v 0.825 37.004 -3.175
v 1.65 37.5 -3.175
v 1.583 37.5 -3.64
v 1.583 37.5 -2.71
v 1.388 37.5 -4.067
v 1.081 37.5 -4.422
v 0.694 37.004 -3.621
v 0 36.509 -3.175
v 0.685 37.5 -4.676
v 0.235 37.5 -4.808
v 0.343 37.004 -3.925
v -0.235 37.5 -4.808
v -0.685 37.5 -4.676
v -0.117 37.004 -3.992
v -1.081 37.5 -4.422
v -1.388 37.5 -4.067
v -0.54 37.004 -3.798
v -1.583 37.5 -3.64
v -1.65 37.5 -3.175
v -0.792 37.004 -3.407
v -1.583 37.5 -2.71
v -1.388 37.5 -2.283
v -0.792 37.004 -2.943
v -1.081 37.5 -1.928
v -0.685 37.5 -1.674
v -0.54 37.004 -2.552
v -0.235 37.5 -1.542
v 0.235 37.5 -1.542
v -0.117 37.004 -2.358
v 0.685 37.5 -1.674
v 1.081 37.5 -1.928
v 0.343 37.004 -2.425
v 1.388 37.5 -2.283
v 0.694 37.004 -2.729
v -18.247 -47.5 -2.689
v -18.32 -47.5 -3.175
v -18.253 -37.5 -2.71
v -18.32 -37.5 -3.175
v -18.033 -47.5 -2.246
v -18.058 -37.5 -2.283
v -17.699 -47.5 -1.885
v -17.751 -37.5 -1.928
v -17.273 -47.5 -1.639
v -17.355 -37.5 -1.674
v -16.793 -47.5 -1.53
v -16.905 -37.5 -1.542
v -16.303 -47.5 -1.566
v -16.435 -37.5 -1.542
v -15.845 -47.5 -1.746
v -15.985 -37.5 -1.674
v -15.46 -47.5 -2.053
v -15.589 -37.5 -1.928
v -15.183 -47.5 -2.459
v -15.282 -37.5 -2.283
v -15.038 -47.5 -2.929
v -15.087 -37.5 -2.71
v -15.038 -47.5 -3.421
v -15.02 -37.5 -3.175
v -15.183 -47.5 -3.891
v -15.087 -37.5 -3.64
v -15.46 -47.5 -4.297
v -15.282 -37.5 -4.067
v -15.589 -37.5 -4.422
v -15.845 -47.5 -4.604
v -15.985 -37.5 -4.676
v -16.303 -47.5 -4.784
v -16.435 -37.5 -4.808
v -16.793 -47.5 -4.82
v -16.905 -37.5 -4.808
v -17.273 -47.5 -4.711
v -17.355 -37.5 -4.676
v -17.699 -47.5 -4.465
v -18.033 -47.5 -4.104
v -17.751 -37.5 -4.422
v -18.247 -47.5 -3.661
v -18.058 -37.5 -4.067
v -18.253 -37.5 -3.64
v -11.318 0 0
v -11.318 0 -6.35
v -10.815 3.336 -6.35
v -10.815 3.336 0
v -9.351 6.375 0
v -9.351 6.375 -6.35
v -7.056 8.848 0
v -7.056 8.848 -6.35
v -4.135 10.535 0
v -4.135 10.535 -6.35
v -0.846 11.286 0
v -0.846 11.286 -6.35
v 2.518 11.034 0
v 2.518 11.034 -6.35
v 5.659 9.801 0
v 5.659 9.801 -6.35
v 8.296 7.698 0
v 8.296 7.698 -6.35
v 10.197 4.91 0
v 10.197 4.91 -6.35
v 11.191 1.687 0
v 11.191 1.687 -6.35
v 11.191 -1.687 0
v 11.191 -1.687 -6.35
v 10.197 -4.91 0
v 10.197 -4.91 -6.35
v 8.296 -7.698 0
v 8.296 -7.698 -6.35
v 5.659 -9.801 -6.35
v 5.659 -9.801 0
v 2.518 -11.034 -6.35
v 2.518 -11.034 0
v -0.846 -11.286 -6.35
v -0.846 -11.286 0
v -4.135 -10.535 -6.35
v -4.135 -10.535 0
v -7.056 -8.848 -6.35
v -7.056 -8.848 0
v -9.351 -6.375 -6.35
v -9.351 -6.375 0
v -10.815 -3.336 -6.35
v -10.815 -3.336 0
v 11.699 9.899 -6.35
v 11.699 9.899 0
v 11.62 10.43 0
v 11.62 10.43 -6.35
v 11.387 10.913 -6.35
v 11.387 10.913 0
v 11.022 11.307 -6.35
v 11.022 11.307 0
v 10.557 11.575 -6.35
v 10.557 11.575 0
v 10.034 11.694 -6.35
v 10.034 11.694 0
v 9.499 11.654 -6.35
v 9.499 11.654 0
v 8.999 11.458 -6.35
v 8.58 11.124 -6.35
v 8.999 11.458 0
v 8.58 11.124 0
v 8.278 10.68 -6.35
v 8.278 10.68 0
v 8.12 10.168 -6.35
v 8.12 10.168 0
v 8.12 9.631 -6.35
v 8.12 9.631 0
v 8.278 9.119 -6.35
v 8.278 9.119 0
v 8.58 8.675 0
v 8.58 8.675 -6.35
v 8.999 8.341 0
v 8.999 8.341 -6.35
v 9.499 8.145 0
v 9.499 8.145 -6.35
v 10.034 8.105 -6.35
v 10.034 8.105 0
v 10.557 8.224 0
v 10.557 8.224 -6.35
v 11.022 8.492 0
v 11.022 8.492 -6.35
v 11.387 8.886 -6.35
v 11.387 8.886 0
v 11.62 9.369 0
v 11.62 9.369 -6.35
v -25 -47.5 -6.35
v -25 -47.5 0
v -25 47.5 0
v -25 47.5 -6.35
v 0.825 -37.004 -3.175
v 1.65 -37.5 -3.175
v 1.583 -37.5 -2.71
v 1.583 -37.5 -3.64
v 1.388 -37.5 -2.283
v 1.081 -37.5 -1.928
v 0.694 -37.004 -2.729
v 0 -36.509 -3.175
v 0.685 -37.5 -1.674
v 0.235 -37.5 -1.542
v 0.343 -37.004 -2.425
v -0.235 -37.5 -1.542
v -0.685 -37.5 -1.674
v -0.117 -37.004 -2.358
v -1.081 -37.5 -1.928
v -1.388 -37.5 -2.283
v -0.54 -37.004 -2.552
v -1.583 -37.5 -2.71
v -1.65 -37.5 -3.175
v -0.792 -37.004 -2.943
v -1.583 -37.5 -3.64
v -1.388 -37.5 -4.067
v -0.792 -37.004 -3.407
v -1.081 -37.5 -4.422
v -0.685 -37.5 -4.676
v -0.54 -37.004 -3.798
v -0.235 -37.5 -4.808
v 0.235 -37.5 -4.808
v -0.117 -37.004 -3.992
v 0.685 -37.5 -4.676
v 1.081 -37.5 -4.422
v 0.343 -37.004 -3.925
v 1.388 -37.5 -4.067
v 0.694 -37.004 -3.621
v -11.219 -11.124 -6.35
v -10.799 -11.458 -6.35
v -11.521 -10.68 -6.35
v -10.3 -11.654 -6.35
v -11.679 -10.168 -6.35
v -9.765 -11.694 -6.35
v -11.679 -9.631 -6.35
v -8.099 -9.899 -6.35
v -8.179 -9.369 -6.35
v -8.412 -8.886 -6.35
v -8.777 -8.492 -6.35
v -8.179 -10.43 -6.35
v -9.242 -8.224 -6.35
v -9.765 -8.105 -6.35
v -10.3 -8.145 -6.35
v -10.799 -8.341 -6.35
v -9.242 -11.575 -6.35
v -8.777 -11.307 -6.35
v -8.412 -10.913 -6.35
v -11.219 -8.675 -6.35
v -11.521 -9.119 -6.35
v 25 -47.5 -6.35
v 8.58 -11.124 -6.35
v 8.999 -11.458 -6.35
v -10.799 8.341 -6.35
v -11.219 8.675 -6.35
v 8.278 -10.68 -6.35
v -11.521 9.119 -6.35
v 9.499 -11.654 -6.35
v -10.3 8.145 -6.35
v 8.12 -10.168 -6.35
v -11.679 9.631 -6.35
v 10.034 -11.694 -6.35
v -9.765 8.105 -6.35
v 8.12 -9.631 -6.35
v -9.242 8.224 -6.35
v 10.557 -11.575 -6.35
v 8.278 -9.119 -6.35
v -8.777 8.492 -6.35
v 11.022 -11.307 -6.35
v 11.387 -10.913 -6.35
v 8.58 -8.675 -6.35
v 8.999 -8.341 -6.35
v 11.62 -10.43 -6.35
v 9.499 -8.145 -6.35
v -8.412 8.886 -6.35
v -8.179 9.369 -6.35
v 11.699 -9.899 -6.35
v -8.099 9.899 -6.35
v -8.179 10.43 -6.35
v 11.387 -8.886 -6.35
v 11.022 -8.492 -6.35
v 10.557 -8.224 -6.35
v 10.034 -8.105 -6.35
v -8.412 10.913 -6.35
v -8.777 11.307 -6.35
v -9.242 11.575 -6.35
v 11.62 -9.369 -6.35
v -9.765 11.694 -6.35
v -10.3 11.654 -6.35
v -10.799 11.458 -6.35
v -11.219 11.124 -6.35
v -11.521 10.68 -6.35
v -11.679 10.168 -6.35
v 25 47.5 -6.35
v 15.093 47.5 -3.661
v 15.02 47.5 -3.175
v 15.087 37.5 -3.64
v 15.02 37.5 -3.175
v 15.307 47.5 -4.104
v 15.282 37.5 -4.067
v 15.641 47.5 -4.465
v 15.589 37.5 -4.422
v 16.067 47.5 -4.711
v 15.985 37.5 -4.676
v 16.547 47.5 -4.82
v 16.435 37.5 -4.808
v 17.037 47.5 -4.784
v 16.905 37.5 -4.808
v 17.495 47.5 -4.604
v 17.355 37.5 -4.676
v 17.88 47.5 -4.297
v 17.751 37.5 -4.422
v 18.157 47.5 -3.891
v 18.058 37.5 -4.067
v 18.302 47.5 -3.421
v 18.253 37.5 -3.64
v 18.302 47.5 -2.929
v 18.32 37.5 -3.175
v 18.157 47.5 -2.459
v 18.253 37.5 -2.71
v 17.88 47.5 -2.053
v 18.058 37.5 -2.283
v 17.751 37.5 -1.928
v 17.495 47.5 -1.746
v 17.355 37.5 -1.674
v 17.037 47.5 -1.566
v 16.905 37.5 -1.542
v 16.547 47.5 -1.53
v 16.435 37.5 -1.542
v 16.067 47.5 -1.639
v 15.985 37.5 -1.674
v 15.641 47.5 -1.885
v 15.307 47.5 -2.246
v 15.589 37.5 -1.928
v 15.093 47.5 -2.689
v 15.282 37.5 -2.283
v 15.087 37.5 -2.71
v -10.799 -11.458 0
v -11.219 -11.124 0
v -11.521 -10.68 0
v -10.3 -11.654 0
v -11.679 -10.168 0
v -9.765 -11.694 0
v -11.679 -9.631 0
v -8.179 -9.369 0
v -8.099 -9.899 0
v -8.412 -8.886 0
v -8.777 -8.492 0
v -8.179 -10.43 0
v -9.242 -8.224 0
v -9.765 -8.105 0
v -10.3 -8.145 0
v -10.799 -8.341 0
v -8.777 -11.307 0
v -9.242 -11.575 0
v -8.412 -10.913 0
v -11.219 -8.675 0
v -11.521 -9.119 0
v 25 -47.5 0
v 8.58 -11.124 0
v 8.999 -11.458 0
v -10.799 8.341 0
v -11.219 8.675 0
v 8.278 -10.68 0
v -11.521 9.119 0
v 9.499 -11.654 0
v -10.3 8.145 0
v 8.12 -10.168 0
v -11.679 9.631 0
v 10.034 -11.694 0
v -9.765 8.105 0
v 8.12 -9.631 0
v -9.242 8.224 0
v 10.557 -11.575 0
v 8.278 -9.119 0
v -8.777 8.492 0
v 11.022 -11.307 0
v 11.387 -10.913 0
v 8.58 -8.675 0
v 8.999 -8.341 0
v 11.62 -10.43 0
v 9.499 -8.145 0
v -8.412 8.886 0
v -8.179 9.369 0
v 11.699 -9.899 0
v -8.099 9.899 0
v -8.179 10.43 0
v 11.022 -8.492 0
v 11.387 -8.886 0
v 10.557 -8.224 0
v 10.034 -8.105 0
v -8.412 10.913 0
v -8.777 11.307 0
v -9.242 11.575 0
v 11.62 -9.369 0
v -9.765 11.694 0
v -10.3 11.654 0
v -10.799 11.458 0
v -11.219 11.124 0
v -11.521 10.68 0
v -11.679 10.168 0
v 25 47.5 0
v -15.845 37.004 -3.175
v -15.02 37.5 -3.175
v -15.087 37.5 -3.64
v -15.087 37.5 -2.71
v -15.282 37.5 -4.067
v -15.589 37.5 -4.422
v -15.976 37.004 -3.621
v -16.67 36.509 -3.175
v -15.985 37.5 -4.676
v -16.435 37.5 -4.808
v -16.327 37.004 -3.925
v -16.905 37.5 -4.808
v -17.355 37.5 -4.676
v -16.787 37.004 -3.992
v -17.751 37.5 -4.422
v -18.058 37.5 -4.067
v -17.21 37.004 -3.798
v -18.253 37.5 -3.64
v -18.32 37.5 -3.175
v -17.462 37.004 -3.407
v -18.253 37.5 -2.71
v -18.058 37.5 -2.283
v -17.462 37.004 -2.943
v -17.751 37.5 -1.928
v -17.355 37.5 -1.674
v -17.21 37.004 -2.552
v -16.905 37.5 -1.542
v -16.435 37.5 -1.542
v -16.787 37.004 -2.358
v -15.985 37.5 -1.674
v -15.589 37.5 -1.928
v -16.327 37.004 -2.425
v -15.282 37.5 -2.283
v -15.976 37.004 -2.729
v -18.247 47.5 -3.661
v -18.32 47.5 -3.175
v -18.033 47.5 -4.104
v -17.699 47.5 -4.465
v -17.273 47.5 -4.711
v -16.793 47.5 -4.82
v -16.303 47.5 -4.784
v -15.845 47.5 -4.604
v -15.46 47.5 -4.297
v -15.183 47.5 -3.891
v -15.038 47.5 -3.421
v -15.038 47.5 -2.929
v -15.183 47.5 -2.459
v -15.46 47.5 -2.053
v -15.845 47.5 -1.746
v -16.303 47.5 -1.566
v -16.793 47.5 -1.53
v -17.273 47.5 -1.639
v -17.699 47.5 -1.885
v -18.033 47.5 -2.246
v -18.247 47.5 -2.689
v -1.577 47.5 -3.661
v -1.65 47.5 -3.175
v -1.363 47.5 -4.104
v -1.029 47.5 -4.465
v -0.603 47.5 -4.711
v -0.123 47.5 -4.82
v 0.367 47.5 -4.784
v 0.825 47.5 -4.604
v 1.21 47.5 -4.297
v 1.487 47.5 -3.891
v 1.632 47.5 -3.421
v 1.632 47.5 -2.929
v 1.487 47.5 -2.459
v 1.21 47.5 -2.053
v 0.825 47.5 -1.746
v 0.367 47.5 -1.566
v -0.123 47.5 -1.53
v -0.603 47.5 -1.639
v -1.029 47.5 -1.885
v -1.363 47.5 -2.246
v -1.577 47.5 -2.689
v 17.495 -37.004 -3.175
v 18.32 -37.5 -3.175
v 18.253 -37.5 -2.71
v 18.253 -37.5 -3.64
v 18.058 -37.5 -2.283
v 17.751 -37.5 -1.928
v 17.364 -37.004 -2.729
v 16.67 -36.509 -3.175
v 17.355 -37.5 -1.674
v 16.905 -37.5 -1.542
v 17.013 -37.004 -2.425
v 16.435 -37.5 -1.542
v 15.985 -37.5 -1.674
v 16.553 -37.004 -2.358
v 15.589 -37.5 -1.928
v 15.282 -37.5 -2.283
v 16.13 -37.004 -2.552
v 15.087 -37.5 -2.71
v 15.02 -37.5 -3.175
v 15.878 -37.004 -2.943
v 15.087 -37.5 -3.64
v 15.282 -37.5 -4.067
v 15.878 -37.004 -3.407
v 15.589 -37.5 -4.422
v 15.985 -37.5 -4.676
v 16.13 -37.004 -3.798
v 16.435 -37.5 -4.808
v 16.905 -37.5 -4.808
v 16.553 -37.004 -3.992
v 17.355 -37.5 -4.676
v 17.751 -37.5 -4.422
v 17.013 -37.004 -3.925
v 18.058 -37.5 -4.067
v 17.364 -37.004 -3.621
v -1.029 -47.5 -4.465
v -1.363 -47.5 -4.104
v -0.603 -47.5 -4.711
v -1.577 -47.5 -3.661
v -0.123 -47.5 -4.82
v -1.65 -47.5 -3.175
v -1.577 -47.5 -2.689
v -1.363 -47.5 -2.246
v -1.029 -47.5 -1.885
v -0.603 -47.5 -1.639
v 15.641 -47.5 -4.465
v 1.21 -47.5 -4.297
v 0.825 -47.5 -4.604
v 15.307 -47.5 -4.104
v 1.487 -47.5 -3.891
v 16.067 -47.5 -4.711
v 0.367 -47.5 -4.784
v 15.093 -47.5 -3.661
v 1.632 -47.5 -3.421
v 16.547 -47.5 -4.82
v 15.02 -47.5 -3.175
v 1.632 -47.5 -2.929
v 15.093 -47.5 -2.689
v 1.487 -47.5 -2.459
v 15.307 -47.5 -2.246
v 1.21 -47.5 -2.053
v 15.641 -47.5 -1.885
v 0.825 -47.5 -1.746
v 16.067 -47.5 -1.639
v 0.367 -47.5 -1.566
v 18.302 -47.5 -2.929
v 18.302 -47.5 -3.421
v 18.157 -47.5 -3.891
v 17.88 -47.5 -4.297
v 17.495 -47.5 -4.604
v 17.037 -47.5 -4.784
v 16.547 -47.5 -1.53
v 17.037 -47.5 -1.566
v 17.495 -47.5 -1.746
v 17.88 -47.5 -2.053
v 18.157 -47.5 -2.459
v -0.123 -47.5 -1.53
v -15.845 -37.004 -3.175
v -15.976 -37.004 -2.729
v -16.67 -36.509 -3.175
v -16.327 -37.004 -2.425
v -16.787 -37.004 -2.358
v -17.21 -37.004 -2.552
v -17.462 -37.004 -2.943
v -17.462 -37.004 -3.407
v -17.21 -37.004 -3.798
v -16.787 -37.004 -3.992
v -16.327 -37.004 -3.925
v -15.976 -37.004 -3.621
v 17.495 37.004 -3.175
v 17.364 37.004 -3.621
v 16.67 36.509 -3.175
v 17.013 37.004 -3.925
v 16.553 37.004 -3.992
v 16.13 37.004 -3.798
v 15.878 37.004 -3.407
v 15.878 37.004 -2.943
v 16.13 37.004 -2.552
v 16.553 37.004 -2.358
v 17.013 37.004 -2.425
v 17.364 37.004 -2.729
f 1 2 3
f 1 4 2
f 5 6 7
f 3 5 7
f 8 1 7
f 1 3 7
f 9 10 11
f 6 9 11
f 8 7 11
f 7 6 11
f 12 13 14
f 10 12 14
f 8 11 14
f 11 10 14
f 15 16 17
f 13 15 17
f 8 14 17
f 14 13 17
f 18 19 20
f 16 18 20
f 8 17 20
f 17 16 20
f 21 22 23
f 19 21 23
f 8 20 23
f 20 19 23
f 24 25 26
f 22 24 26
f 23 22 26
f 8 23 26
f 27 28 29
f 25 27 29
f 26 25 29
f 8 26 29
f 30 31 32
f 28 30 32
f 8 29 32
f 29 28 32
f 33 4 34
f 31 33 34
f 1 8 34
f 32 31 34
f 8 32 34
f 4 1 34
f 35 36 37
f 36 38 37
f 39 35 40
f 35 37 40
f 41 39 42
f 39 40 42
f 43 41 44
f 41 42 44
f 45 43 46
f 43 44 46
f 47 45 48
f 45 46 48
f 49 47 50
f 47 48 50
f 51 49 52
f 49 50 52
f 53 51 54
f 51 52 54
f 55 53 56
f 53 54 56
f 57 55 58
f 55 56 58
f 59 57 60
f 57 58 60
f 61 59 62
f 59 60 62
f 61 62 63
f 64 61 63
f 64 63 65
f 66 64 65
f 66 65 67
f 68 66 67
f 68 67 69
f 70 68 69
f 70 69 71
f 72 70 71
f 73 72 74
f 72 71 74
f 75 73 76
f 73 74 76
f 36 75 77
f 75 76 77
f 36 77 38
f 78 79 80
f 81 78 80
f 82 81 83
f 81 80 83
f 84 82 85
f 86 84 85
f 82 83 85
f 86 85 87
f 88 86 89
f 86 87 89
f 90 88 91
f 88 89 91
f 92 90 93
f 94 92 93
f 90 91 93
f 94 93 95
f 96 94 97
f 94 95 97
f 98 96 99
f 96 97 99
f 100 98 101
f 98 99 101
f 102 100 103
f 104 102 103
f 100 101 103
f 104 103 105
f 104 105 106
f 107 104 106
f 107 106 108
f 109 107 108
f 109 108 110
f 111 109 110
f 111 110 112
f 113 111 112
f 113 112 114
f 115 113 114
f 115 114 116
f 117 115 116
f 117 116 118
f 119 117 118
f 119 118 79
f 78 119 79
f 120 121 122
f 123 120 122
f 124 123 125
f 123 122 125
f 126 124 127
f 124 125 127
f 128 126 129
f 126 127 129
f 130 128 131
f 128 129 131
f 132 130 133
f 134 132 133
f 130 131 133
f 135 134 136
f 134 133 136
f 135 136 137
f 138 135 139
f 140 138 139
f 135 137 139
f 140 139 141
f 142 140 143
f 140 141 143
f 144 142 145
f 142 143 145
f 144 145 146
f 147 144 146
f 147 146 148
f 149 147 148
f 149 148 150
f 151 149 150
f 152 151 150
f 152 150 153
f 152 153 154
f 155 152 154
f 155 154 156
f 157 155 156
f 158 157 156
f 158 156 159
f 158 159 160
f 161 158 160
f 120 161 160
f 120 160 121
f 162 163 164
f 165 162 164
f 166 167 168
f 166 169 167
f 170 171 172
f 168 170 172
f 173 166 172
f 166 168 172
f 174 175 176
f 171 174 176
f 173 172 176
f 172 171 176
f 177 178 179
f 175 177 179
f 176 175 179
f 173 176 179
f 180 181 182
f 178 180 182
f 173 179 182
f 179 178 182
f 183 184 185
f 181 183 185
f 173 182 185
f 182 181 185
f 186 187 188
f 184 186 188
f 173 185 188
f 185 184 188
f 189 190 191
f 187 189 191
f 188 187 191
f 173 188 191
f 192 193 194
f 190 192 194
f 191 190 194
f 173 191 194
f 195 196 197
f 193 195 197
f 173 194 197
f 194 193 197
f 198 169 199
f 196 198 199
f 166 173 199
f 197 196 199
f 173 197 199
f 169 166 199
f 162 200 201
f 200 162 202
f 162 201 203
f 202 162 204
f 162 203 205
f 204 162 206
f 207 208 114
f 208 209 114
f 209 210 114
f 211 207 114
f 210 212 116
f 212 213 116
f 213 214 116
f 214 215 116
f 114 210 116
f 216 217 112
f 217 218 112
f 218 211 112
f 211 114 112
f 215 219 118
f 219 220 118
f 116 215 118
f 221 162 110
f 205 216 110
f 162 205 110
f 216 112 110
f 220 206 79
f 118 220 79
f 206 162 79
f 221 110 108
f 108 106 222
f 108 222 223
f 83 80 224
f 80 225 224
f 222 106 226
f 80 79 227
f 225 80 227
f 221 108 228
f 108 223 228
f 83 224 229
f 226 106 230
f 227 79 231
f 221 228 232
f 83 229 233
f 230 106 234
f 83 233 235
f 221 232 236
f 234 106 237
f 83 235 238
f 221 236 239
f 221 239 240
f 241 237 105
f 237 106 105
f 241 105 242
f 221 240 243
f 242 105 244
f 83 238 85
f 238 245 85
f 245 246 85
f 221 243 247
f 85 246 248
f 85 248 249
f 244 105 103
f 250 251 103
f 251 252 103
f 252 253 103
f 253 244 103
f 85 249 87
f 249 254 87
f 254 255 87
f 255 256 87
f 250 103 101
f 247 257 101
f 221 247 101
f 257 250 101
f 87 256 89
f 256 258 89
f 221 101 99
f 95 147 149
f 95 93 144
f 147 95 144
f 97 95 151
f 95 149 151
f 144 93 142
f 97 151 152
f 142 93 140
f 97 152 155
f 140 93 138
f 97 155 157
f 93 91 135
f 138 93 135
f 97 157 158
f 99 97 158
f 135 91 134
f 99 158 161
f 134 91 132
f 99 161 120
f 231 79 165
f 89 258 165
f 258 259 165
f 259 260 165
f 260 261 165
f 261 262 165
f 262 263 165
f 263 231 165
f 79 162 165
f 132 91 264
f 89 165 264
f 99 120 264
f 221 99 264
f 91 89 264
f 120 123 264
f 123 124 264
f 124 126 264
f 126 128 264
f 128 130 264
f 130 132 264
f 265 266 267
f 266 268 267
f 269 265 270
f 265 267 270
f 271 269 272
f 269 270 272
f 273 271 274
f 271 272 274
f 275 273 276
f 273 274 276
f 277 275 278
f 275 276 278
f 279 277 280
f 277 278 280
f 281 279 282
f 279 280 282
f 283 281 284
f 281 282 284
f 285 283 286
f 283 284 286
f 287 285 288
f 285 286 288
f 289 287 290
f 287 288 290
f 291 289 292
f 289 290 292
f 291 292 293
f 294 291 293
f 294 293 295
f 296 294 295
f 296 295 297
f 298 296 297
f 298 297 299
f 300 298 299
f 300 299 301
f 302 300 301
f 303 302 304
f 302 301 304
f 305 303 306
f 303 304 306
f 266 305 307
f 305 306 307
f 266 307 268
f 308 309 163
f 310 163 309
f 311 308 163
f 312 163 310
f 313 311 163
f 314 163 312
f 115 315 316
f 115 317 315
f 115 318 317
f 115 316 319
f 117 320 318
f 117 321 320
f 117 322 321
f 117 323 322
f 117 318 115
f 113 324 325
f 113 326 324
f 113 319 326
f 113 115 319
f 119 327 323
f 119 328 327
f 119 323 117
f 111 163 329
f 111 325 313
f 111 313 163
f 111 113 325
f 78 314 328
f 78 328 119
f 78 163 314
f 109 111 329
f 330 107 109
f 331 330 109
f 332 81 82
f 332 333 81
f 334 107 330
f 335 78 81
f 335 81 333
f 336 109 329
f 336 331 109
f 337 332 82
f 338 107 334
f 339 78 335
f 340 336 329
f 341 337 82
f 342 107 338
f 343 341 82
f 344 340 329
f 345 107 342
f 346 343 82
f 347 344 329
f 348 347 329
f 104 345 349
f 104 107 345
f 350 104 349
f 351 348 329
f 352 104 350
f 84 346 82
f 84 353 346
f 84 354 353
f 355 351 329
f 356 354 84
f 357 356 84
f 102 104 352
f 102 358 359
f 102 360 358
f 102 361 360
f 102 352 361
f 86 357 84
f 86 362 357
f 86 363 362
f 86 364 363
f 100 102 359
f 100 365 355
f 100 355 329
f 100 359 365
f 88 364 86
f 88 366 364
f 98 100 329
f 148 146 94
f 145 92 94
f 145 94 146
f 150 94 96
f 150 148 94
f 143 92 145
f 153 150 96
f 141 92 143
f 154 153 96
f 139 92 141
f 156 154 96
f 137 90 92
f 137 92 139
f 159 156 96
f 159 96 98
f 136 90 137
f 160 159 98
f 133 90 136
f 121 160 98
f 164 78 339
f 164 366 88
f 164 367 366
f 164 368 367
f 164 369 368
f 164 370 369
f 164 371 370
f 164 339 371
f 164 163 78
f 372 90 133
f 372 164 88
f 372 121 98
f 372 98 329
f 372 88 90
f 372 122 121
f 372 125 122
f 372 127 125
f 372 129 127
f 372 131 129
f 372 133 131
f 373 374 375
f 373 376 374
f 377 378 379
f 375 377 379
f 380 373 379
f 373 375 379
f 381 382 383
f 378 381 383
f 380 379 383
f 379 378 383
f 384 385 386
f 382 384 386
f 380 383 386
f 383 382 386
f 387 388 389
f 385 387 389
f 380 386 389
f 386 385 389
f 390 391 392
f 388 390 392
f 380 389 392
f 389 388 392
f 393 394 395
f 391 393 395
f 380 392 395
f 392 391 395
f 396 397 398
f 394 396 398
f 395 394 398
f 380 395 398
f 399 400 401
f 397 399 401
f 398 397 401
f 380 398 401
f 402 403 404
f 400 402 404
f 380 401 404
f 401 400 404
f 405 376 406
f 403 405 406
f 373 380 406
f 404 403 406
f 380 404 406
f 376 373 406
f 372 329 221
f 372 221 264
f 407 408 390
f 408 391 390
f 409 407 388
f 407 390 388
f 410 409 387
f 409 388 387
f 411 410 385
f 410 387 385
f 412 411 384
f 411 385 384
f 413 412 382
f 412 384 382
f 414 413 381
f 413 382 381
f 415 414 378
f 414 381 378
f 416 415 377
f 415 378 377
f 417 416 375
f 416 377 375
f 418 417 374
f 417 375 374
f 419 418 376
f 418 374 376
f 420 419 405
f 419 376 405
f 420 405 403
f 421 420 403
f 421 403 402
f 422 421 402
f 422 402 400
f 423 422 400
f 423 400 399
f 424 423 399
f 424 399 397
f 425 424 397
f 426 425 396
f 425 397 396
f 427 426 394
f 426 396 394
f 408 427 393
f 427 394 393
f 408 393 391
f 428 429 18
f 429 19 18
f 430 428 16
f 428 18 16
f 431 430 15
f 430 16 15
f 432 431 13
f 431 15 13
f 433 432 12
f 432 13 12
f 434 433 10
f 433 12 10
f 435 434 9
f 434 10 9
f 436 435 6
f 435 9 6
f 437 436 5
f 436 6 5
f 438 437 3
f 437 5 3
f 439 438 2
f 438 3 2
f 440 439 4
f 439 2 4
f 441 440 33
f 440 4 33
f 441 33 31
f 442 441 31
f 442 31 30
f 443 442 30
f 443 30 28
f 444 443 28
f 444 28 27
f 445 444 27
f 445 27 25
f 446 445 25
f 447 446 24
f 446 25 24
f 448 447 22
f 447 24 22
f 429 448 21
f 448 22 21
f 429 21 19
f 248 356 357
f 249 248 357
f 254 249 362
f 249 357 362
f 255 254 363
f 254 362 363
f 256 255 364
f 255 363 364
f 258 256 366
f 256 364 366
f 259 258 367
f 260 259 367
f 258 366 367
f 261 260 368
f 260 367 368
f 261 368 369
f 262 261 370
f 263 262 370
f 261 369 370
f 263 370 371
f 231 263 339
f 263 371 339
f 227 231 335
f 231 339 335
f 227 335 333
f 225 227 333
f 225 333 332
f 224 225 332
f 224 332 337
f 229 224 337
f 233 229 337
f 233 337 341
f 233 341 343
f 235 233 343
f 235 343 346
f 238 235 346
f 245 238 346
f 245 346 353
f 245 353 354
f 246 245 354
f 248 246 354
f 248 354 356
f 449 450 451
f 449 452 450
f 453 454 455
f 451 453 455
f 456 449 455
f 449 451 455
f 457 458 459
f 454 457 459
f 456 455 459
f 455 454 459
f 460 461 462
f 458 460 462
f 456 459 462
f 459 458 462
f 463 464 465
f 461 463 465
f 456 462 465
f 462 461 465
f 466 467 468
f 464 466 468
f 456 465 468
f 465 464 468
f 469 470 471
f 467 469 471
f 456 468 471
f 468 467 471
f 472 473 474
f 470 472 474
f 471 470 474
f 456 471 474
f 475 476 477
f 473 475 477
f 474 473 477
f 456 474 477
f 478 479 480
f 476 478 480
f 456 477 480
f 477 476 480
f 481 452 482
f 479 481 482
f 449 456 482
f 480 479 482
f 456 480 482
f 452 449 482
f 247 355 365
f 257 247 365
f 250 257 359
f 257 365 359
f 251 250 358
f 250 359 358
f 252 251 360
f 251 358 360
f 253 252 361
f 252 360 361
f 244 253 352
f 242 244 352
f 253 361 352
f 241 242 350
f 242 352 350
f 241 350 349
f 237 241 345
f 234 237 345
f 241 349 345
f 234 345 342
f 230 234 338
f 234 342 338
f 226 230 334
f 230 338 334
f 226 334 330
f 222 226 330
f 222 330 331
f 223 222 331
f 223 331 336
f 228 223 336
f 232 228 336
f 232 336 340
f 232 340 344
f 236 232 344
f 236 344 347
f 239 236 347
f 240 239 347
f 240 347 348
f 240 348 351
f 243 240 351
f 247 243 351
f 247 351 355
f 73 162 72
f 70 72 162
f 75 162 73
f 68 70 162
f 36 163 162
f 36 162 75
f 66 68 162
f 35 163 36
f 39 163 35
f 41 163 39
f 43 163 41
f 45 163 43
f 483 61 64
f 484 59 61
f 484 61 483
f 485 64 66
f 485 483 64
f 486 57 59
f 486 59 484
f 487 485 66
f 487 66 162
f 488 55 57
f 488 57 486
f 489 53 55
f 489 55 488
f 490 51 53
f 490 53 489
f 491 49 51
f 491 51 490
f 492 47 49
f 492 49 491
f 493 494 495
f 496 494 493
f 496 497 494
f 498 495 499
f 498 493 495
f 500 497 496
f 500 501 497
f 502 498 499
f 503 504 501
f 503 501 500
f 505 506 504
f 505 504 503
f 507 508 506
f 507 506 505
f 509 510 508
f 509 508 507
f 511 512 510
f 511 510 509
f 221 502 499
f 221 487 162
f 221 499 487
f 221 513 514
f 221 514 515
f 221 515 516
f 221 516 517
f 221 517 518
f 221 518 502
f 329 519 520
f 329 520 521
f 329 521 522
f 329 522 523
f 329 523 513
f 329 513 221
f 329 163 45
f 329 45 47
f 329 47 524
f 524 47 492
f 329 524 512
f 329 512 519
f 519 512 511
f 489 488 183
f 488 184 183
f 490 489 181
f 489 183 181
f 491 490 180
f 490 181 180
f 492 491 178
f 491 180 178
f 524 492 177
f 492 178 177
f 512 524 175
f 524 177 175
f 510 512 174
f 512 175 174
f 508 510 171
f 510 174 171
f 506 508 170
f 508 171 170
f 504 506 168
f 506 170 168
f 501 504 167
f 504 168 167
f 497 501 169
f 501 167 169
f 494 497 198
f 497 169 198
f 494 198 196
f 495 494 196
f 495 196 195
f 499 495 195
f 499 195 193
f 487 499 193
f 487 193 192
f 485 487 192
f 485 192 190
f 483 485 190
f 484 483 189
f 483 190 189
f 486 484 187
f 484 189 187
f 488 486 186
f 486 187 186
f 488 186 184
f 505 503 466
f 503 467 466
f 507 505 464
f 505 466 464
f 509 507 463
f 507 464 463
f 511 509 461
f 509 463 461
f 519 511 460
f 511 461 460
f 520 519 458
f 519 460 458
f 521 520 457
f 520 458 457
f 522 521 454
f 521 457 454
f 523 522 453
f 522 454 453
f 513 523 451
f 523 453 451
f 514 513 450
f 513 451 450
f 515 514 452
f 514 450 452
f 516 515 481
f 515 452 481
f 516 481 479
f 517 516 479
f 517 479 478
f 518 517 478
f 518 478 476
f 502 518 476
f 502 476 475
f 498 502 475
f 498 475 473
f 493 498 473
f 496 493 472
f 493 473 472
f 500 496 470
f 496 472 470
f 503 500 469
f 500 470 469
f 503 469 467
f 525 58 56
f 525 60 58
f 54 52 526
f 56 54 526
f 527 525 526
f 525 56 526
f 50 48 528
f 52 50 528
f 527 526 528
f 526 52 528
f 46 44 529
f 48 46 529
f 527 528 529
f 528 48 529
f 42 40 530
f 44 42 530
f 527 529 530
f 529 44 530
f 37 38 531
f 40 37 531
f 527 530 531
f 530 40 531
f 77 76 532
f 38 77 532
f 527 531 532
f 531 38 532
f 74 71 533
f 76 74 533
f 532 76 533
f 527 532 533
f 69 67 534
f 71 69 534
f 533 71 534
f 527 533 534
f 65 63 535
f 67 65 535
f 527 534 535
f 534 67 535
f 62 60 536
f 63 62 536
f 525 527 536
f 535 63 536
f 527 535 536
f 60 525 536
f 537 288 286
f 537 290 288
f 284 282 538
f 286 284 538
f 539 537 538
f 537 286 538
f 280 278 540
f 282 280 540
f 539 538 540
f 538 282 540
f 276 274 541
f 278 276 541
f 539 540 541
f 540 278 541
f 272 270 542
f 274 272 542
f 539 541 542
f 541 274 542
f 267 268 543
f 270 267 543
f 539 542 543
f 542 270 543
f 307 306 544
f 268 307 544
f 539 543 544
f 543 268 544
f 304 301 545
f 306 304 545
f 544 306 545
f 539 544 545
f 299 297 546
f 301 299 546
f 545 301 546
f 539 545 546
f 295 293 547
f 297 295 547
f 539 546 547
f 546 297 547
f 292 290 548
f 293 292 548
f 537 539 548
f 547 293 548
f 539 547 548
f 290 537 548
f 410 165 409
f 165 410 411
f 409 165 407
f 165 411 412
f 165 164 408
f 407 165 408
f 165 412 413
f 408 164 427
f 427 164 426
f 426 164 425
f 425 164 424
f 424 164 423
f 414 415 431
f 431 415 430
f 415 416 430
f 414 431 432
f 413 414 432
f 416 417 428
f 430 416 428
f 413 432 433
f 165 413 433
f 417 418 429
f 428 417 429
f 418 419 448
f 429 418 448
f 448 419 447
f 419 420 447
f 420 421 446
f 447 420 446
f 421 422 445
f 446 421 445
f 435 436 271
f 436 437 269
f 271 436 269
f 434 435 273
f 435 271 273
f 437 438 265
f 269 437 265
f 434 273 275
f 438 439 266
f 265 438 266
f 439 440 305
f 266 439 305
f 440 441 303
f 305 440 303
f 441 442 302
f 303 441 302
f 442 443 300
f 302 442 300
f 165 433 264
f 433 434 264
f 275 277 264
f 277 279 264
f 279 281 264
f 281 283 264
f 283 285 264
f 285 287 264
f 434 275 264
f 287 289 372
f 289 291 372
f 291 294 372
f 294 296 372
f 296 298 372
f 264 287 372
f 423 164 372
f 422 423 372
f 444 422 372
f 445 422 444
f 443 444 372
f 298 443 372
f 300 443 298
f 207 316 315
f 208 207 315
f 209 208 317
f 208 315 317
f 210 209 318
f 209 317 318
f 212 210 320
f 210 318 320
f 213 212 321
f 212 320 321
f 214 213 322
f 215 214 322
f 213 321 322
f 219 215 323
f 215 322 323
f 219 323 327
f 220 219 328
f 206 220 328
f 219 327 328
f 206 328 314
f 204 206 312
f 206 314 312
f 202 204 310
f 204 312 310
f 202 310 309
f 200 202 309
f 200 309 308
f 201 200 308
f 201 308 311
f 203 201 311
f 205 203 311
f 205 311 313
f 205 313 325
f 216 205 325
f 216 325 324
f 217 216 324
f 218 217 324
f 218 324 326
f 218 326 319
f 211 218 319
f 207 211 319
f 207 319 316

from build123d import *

# Parameters (mm, degrees)
SKETCH1_W                 = 50
SKETCH1_H                 = 95
BOSS_EXTRUDE1_DEPTH       = 6.35
M4X0_7_TAPPED_HOLE1_D     = 3.3
M4X0_7_TAPPED_HOLE1_DEPTH = 10
M4X0_7_TAPPED_HOLE1_TIP   = 0.991420021
M4X0_7_TAPPED_HOLE2_D     = 3.3
M4X0_7_TAPPED_HOLE2_DEPTH = 10
M4X0_7_TAPPED_HOLE2_TIP   = 0.991420021
SKETCH7_R                 = 11.3175
CUT_EXTRUDE1_DEPTH        = 55.051572595
M3_CLEARANCE_HOLE1_D      = 3.6


with BuildPart() as part:
    # Sketch1 → Boss-Extrude1 (new body)
    with BuildSketch(Plane.XY):
        Rectangle(SKETCH1_W, SKETCH1_H)
    extrude(amount=-BOSS_EXTRUDE1_DEPTH)

    # M4x0.7 Tapped Hole1
    with Locations(Plane.XZ.offset(47.5)):
        with Locations((-16.67, -3.175), (16.67, -3.175), (0, -3.175)):
            Hole(M4X0_7_TAPPED_HOLE1_D / 2, depth=M4X0_7_TAPPED_HOLE1_DEPTH)
            with Locations((0, 0, -(M4X0_7_TAPPED_HOLE1_DEPTH + M4X0_7_TAPPED_HOLE1_TIP / 2))):  # 118° drill point
                Cone(0, M4X0_7_TAPPED_HOLE1_D / 2, M4X0_7_TAPPED_HOLE1_TIP, mode=Mode.SUBTRACT)

    # M4x0.7 Tapped Hole2
    with Locations(Plane(origin=(0, 47.5, 0), x_dir=(1, 0, 0), z_dir=(0, 1, 0))):
        with Locations((-16.67, 3.175), (0, 3.175), (16.67, 3.175)):
            Hole(M4X0_7_TAPPED_HOLE2_D / 2, depth=M4X0_7_TAPPED_HOLE2_DEPTH)
            with Locations((0, 0, -(M4X0_7_TAPPED_HOLE2_DEPTH + M4X0_7_TAPPED_HOLE2_TIP / 2))):  # 118° drill point
                Cone(0, M4X0_7_TAPPED_HOLE2_D / 2, M4X0_7_TAPPED_HOLE2_TIP, mode=Mode.SUBTRACT)

    # Sketch7 → Cut-Extrude1 (cut, through all)
    with BuildSketch(Plane(origin=(0, 0, -6.35), x_dir=(-1, 0, 0), z_dir=(0, 0, -1))):
        Circle(SKETCH7_R)
    extrude(amount=-CUT_EXTRUDE1_DEPTH, mode=Mode.SUBTRACT)

    # M3 Clearance Hole1 (through all)
    with Locations(Plane(origin=(0, 0, -6.35), x_dir=(-1, 0, 0), z_dir=(0, 0, -1))):
        with Locations((-9.899494937, 9.899494937), (9.899494937, 9.899494937), (9.899494937, -9.899494937), (-9.899494937, -9.899494937), (0, 0)):
            Hole(M3_CLEARANCE_HOLE1_D / 2)


solid = part.part
